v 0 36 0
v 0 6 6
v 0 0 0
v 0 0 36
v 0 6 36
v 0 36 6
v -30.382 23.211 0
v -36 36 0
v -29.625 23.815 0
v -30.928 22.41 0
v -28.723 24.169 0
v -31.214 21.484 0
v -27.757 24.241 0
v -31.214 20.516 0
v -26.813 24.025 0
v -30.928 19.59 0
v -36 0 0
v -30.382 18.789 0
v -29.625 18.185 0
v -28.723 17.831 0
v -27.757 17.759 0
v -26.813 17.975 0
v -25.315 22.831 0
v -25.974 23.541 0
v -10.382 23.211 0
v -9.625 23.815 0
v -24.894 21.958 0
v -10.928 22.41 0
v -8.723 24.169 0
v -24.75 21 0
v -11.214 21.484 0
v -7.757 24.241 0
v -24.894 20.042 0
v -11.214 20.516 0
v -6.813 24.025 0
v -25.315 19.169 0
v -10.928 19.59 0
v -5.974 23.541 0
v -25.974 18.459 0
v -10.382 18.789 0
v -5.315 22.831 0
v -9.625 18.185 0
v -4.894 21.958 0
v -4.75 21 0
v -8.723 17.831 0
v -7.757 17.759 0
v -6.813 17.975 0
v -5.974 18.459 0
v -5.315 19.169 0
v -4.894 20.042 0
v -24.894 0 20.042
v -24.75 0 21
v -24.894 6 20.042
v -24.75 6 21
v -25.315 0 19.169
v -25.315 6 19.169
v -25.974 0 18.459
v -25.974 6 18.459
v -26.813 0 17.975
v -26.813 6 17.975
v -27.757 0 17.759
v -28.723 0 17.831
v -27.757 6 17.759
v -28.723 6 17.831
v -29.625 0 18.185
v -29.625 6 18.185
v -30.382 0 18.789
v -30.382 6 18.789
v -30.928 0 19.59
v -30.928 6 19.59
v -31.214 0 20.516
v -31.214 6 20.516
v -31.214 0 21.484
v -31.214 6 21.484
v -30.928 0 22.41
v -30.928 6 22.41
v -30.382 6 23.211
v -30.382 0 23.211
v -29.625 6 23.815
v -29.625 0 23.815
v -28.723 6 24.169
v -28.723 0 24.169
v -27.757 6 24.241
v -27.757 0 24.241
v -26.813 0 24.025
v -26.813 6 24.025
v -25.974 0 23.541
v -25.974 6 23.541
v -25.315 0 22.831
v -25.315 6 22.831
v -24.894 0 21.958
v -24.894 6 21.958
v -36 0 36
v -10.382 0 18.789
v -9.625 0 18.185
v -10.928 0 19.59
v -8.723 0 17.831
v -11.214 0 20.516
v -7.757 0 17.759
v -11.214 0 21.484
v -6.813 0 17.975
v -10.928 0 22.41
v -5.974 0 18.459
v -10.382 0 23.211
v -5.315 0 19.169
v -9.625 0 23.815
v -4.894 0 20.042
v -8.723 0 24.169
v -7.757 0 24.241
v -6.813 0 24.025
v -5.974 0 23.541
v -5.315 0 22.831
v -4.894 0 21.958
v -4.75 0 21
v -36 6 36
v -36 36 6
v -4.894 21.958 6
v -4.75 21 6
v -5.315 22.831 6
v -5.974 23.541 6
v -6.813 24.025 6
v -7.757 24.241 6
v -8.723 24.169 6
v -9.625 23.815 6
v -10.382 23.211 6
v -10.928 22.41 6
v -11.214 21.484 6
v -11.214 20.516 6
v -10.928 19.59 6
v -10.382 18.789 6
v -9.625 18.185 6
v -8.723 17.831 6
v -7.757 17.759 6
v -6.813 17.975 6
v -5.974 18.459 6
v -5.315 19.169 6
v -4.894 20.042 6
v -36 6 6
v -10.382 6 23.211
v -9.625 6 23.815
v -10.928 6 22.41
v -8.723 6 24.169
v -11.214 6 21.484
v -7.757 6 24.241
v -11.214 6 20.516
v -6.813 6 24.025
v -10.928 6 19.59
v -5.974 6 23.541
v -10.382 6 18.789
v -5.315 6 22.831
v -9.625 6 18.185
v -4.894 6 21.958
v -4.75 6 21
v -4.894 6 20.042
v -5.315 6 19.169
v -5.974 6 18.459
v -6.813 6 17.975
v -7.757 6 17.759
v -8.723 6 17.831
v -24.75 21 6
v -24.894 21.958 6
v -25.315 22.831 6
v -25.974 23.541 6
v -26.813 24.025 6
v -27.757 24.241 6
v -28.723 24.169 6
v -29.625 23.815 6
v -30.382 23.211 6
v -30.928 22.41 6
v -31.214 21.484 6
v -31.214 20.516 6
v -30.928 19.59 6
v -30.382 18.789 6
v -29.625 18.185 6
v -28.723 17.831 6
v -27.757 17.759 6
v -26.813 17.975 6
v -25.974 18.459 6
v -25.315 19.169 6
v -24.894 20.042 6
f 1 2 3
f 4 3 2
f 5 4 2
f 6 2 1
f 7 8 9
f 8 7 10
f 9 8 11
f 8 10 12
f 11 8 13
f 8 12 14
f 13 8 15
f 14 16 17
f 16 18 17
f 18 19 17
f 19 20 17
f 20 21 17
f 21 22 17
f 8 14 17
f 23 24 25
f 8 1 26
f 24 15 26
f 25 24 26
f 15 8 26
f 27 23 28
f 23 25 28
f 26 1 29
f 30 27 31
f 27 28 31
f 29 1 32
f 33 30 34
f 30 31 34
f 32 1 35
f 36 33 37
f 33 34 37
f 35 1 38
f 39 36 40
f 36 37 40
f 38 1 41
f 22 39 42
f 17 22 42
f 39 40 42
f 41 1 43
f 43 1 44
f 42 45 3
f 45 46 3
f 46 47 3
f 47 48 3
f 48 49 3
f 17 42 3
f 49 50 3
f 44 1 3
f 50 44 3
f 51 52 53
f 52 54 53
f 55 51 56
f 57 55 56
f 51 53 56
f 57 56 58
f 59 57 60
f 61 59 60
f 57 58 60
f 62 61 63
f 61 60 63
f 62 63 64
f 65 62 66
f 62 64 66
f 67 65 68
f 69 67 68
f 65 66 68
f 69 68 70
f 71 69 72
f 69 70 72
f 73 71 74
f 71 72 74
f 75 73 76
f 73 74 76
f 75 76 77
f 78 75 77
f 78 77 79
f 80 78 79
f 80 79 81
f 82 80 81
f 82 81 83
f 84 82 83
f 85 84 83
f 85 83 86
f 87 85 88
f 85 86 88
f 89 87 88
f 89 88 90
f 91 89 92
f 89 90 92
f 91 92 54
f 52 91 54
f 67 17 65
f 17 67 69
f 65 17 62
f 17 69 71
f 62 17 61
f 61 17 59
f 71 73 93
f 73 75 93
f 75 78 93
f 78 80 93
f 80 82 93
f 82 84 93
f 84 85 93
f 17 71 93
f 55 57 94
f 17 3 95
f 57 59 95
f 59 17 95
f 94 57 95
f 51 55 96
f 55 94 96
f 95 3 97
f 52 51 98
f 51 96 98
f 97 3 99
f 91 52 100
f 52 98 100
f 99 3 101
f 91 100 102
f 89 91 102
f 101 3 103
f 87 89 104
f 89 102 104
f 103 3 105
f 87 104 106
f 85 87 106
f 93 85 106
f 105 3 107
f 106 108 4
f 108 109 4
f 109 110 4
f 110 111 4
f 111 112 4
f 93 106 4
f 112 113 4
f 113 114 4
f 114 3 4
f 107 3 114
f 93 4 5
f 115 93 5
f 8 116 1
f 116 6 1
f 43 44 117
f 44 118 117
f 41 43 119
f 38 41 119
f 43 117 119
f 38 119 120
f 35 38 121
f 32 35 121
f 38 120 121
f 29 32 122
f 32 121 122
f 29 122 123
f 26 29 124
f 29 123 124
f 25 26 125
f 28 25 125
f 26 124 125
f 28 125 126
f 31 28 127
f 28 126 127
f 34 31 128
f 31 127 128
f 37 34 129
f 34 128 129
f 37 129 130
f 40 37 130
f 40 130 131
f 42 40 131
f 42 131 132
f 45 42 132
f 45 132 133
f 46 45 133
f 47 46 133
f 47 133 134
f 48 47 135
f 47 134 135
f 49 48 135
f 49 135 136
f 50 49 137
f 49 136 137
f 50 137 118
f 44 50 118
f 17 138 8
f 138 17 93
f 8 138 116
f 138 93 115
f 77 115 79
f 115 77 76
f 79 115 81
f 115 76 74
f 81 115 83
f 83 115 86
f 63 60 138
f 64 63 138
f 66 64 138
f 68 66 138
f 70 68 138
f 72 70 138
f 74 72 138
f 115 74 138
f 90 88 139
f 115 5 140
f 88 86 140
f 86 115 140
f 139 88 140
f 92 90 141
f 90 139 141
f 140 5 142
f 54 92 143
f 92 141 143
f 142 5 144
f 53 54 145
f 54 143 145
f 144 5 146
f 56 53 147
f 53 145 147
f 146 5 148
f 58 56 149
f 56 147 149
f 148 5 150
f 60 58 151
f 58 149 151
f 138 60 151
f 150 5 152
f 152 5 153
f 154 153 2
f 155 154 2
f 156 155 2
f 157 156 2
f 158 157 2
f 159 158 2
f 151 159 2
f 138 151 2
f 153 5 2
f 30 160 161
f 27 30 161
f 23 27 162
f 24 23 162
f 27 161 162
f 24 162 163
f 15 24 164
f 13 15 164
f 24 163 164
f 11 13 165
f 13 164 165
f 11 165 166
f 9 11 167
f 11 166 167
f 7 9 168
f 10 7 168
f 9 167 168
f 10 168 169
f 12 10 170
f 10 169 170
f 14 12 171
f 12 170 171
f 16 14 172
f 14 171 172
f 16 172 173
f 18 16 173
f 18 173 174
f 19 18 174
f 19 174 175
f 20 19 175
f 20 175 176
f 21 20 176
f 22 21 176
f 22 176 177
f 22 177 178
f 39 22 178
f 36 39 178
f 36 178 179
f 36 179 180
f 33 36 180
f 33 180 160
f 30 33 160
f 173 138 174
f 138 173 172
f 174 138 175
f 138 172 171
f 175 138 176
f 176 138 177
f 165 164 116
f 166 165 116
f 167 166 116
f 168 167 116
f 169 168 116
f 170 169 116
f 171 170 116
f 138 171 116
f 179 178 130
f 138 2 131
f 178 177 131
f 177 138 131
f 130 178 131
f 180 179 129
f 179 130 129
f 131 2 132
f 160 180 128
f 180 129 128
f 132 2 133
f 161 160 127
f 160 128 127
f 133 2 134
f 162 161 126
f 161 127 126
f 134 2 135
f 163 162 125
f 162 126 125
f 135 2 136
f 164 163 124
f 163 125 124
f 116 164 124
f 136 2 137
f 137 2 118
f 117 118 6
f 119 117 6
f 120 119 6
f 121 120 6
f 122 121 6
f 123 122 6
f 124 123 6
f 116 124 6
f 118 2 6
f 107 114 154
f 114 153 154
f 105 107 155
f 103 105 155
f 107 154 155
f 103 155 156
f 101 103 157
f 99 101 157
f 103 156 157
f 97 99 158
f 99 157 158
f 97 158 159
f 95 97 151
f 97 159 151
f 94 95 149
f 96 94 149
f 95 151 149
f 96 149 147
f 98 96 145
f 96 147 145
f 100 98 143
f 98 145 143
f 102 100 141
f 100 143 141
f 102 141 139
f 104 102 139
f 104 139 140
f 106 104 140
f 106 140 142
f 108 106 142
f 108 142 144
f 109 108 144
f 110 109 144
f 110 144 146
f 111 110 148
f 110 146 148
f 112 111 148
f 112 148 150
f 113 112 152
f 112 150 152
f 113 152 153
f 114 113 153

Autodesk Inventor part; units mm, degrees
ref_plane "YZ Plane" through (0, 0, 0) normal (1, 0, 0) x (0, 1, 0)
ref_plane "XZ Plane" through (0, 0, 0) normal (0, 1, 0) x (-1, 0, 0)
ref_plane "XY Plane" through (0, 0, 0) normal (0, 0, 1) x (1, 0, 0)
sketch "Sketch1" plane through (0, 0, 0) normal (1, 0, 0) x (0, 1, 0)
  line L0 (0, 0) -> (0, 36)
  line L1 (0, 36) -> (6, 36)
  line L2 (6, 36) -> (6, 6)
  line L3 (6, 6) -> (36, 6)
  line L4 (36, 6) -> (36, 0)
  line L5 (36, 0) -> (0, 0)
  dimension "d0" = 36
  dimension "d1" = 6
  dimension "d2" = 30
  dimension "d3" = 30
  dimension "d4" = 6
  dimension "d5" = 36
extrude "Extrusion1" add sketch "Sketch1" against normal blind 36
sketch "Sketch2" plane through (0, 6, 36) normal (0, 1, 0) x (1, 0, 0)
  circle A0 centre (-28, 15) radius 3.25
  circle A1 centre (-8, 15) radius 3.25
  line L0 (0, 0) -> (-36, 0) projected
  line L1 (0, 30) -> (0, 0) projected
  line L2 (-36, 0) -> (-36, 30) projected
  line L3 (-36, 30) -> (3.723, 30) construction
  point P0 (0, 36)
  point P1 (-5.4498, 30)
  dimension "d8" = 6.5
  dimension "d9" = 6.5
  dimension "d10" = 20
  dimension "d11" = 15
  dimension "d12" = 15
  dimension "d13" = 8
sketch "Sketch3" plane through (0, 6, 6) normal (0, 0, 1) x (1, 0, 0)
  circle A0 centre (-28, 15) radius 3.25
  line L0 (-36, 0) -> (-36, 30) projected
  line L1 (0, 30) -> (-36, 30) projected
  circle A1 centre (-8, 15) radius 3.25
  point P0 (0, -6)
  dimension "d14" = 6.5
  dimension "d15" = 8
  dimension "d16" = 15
  dimension "d17" = 6.5
  dimension "d18" = 20
extrude "Extrusion2" cut sketch "Sketch3" against normal blind 6
extrude "Extrusion3" cut sketch "Sketch2" against normal blind 6
properties part number "Normal_Connector"
